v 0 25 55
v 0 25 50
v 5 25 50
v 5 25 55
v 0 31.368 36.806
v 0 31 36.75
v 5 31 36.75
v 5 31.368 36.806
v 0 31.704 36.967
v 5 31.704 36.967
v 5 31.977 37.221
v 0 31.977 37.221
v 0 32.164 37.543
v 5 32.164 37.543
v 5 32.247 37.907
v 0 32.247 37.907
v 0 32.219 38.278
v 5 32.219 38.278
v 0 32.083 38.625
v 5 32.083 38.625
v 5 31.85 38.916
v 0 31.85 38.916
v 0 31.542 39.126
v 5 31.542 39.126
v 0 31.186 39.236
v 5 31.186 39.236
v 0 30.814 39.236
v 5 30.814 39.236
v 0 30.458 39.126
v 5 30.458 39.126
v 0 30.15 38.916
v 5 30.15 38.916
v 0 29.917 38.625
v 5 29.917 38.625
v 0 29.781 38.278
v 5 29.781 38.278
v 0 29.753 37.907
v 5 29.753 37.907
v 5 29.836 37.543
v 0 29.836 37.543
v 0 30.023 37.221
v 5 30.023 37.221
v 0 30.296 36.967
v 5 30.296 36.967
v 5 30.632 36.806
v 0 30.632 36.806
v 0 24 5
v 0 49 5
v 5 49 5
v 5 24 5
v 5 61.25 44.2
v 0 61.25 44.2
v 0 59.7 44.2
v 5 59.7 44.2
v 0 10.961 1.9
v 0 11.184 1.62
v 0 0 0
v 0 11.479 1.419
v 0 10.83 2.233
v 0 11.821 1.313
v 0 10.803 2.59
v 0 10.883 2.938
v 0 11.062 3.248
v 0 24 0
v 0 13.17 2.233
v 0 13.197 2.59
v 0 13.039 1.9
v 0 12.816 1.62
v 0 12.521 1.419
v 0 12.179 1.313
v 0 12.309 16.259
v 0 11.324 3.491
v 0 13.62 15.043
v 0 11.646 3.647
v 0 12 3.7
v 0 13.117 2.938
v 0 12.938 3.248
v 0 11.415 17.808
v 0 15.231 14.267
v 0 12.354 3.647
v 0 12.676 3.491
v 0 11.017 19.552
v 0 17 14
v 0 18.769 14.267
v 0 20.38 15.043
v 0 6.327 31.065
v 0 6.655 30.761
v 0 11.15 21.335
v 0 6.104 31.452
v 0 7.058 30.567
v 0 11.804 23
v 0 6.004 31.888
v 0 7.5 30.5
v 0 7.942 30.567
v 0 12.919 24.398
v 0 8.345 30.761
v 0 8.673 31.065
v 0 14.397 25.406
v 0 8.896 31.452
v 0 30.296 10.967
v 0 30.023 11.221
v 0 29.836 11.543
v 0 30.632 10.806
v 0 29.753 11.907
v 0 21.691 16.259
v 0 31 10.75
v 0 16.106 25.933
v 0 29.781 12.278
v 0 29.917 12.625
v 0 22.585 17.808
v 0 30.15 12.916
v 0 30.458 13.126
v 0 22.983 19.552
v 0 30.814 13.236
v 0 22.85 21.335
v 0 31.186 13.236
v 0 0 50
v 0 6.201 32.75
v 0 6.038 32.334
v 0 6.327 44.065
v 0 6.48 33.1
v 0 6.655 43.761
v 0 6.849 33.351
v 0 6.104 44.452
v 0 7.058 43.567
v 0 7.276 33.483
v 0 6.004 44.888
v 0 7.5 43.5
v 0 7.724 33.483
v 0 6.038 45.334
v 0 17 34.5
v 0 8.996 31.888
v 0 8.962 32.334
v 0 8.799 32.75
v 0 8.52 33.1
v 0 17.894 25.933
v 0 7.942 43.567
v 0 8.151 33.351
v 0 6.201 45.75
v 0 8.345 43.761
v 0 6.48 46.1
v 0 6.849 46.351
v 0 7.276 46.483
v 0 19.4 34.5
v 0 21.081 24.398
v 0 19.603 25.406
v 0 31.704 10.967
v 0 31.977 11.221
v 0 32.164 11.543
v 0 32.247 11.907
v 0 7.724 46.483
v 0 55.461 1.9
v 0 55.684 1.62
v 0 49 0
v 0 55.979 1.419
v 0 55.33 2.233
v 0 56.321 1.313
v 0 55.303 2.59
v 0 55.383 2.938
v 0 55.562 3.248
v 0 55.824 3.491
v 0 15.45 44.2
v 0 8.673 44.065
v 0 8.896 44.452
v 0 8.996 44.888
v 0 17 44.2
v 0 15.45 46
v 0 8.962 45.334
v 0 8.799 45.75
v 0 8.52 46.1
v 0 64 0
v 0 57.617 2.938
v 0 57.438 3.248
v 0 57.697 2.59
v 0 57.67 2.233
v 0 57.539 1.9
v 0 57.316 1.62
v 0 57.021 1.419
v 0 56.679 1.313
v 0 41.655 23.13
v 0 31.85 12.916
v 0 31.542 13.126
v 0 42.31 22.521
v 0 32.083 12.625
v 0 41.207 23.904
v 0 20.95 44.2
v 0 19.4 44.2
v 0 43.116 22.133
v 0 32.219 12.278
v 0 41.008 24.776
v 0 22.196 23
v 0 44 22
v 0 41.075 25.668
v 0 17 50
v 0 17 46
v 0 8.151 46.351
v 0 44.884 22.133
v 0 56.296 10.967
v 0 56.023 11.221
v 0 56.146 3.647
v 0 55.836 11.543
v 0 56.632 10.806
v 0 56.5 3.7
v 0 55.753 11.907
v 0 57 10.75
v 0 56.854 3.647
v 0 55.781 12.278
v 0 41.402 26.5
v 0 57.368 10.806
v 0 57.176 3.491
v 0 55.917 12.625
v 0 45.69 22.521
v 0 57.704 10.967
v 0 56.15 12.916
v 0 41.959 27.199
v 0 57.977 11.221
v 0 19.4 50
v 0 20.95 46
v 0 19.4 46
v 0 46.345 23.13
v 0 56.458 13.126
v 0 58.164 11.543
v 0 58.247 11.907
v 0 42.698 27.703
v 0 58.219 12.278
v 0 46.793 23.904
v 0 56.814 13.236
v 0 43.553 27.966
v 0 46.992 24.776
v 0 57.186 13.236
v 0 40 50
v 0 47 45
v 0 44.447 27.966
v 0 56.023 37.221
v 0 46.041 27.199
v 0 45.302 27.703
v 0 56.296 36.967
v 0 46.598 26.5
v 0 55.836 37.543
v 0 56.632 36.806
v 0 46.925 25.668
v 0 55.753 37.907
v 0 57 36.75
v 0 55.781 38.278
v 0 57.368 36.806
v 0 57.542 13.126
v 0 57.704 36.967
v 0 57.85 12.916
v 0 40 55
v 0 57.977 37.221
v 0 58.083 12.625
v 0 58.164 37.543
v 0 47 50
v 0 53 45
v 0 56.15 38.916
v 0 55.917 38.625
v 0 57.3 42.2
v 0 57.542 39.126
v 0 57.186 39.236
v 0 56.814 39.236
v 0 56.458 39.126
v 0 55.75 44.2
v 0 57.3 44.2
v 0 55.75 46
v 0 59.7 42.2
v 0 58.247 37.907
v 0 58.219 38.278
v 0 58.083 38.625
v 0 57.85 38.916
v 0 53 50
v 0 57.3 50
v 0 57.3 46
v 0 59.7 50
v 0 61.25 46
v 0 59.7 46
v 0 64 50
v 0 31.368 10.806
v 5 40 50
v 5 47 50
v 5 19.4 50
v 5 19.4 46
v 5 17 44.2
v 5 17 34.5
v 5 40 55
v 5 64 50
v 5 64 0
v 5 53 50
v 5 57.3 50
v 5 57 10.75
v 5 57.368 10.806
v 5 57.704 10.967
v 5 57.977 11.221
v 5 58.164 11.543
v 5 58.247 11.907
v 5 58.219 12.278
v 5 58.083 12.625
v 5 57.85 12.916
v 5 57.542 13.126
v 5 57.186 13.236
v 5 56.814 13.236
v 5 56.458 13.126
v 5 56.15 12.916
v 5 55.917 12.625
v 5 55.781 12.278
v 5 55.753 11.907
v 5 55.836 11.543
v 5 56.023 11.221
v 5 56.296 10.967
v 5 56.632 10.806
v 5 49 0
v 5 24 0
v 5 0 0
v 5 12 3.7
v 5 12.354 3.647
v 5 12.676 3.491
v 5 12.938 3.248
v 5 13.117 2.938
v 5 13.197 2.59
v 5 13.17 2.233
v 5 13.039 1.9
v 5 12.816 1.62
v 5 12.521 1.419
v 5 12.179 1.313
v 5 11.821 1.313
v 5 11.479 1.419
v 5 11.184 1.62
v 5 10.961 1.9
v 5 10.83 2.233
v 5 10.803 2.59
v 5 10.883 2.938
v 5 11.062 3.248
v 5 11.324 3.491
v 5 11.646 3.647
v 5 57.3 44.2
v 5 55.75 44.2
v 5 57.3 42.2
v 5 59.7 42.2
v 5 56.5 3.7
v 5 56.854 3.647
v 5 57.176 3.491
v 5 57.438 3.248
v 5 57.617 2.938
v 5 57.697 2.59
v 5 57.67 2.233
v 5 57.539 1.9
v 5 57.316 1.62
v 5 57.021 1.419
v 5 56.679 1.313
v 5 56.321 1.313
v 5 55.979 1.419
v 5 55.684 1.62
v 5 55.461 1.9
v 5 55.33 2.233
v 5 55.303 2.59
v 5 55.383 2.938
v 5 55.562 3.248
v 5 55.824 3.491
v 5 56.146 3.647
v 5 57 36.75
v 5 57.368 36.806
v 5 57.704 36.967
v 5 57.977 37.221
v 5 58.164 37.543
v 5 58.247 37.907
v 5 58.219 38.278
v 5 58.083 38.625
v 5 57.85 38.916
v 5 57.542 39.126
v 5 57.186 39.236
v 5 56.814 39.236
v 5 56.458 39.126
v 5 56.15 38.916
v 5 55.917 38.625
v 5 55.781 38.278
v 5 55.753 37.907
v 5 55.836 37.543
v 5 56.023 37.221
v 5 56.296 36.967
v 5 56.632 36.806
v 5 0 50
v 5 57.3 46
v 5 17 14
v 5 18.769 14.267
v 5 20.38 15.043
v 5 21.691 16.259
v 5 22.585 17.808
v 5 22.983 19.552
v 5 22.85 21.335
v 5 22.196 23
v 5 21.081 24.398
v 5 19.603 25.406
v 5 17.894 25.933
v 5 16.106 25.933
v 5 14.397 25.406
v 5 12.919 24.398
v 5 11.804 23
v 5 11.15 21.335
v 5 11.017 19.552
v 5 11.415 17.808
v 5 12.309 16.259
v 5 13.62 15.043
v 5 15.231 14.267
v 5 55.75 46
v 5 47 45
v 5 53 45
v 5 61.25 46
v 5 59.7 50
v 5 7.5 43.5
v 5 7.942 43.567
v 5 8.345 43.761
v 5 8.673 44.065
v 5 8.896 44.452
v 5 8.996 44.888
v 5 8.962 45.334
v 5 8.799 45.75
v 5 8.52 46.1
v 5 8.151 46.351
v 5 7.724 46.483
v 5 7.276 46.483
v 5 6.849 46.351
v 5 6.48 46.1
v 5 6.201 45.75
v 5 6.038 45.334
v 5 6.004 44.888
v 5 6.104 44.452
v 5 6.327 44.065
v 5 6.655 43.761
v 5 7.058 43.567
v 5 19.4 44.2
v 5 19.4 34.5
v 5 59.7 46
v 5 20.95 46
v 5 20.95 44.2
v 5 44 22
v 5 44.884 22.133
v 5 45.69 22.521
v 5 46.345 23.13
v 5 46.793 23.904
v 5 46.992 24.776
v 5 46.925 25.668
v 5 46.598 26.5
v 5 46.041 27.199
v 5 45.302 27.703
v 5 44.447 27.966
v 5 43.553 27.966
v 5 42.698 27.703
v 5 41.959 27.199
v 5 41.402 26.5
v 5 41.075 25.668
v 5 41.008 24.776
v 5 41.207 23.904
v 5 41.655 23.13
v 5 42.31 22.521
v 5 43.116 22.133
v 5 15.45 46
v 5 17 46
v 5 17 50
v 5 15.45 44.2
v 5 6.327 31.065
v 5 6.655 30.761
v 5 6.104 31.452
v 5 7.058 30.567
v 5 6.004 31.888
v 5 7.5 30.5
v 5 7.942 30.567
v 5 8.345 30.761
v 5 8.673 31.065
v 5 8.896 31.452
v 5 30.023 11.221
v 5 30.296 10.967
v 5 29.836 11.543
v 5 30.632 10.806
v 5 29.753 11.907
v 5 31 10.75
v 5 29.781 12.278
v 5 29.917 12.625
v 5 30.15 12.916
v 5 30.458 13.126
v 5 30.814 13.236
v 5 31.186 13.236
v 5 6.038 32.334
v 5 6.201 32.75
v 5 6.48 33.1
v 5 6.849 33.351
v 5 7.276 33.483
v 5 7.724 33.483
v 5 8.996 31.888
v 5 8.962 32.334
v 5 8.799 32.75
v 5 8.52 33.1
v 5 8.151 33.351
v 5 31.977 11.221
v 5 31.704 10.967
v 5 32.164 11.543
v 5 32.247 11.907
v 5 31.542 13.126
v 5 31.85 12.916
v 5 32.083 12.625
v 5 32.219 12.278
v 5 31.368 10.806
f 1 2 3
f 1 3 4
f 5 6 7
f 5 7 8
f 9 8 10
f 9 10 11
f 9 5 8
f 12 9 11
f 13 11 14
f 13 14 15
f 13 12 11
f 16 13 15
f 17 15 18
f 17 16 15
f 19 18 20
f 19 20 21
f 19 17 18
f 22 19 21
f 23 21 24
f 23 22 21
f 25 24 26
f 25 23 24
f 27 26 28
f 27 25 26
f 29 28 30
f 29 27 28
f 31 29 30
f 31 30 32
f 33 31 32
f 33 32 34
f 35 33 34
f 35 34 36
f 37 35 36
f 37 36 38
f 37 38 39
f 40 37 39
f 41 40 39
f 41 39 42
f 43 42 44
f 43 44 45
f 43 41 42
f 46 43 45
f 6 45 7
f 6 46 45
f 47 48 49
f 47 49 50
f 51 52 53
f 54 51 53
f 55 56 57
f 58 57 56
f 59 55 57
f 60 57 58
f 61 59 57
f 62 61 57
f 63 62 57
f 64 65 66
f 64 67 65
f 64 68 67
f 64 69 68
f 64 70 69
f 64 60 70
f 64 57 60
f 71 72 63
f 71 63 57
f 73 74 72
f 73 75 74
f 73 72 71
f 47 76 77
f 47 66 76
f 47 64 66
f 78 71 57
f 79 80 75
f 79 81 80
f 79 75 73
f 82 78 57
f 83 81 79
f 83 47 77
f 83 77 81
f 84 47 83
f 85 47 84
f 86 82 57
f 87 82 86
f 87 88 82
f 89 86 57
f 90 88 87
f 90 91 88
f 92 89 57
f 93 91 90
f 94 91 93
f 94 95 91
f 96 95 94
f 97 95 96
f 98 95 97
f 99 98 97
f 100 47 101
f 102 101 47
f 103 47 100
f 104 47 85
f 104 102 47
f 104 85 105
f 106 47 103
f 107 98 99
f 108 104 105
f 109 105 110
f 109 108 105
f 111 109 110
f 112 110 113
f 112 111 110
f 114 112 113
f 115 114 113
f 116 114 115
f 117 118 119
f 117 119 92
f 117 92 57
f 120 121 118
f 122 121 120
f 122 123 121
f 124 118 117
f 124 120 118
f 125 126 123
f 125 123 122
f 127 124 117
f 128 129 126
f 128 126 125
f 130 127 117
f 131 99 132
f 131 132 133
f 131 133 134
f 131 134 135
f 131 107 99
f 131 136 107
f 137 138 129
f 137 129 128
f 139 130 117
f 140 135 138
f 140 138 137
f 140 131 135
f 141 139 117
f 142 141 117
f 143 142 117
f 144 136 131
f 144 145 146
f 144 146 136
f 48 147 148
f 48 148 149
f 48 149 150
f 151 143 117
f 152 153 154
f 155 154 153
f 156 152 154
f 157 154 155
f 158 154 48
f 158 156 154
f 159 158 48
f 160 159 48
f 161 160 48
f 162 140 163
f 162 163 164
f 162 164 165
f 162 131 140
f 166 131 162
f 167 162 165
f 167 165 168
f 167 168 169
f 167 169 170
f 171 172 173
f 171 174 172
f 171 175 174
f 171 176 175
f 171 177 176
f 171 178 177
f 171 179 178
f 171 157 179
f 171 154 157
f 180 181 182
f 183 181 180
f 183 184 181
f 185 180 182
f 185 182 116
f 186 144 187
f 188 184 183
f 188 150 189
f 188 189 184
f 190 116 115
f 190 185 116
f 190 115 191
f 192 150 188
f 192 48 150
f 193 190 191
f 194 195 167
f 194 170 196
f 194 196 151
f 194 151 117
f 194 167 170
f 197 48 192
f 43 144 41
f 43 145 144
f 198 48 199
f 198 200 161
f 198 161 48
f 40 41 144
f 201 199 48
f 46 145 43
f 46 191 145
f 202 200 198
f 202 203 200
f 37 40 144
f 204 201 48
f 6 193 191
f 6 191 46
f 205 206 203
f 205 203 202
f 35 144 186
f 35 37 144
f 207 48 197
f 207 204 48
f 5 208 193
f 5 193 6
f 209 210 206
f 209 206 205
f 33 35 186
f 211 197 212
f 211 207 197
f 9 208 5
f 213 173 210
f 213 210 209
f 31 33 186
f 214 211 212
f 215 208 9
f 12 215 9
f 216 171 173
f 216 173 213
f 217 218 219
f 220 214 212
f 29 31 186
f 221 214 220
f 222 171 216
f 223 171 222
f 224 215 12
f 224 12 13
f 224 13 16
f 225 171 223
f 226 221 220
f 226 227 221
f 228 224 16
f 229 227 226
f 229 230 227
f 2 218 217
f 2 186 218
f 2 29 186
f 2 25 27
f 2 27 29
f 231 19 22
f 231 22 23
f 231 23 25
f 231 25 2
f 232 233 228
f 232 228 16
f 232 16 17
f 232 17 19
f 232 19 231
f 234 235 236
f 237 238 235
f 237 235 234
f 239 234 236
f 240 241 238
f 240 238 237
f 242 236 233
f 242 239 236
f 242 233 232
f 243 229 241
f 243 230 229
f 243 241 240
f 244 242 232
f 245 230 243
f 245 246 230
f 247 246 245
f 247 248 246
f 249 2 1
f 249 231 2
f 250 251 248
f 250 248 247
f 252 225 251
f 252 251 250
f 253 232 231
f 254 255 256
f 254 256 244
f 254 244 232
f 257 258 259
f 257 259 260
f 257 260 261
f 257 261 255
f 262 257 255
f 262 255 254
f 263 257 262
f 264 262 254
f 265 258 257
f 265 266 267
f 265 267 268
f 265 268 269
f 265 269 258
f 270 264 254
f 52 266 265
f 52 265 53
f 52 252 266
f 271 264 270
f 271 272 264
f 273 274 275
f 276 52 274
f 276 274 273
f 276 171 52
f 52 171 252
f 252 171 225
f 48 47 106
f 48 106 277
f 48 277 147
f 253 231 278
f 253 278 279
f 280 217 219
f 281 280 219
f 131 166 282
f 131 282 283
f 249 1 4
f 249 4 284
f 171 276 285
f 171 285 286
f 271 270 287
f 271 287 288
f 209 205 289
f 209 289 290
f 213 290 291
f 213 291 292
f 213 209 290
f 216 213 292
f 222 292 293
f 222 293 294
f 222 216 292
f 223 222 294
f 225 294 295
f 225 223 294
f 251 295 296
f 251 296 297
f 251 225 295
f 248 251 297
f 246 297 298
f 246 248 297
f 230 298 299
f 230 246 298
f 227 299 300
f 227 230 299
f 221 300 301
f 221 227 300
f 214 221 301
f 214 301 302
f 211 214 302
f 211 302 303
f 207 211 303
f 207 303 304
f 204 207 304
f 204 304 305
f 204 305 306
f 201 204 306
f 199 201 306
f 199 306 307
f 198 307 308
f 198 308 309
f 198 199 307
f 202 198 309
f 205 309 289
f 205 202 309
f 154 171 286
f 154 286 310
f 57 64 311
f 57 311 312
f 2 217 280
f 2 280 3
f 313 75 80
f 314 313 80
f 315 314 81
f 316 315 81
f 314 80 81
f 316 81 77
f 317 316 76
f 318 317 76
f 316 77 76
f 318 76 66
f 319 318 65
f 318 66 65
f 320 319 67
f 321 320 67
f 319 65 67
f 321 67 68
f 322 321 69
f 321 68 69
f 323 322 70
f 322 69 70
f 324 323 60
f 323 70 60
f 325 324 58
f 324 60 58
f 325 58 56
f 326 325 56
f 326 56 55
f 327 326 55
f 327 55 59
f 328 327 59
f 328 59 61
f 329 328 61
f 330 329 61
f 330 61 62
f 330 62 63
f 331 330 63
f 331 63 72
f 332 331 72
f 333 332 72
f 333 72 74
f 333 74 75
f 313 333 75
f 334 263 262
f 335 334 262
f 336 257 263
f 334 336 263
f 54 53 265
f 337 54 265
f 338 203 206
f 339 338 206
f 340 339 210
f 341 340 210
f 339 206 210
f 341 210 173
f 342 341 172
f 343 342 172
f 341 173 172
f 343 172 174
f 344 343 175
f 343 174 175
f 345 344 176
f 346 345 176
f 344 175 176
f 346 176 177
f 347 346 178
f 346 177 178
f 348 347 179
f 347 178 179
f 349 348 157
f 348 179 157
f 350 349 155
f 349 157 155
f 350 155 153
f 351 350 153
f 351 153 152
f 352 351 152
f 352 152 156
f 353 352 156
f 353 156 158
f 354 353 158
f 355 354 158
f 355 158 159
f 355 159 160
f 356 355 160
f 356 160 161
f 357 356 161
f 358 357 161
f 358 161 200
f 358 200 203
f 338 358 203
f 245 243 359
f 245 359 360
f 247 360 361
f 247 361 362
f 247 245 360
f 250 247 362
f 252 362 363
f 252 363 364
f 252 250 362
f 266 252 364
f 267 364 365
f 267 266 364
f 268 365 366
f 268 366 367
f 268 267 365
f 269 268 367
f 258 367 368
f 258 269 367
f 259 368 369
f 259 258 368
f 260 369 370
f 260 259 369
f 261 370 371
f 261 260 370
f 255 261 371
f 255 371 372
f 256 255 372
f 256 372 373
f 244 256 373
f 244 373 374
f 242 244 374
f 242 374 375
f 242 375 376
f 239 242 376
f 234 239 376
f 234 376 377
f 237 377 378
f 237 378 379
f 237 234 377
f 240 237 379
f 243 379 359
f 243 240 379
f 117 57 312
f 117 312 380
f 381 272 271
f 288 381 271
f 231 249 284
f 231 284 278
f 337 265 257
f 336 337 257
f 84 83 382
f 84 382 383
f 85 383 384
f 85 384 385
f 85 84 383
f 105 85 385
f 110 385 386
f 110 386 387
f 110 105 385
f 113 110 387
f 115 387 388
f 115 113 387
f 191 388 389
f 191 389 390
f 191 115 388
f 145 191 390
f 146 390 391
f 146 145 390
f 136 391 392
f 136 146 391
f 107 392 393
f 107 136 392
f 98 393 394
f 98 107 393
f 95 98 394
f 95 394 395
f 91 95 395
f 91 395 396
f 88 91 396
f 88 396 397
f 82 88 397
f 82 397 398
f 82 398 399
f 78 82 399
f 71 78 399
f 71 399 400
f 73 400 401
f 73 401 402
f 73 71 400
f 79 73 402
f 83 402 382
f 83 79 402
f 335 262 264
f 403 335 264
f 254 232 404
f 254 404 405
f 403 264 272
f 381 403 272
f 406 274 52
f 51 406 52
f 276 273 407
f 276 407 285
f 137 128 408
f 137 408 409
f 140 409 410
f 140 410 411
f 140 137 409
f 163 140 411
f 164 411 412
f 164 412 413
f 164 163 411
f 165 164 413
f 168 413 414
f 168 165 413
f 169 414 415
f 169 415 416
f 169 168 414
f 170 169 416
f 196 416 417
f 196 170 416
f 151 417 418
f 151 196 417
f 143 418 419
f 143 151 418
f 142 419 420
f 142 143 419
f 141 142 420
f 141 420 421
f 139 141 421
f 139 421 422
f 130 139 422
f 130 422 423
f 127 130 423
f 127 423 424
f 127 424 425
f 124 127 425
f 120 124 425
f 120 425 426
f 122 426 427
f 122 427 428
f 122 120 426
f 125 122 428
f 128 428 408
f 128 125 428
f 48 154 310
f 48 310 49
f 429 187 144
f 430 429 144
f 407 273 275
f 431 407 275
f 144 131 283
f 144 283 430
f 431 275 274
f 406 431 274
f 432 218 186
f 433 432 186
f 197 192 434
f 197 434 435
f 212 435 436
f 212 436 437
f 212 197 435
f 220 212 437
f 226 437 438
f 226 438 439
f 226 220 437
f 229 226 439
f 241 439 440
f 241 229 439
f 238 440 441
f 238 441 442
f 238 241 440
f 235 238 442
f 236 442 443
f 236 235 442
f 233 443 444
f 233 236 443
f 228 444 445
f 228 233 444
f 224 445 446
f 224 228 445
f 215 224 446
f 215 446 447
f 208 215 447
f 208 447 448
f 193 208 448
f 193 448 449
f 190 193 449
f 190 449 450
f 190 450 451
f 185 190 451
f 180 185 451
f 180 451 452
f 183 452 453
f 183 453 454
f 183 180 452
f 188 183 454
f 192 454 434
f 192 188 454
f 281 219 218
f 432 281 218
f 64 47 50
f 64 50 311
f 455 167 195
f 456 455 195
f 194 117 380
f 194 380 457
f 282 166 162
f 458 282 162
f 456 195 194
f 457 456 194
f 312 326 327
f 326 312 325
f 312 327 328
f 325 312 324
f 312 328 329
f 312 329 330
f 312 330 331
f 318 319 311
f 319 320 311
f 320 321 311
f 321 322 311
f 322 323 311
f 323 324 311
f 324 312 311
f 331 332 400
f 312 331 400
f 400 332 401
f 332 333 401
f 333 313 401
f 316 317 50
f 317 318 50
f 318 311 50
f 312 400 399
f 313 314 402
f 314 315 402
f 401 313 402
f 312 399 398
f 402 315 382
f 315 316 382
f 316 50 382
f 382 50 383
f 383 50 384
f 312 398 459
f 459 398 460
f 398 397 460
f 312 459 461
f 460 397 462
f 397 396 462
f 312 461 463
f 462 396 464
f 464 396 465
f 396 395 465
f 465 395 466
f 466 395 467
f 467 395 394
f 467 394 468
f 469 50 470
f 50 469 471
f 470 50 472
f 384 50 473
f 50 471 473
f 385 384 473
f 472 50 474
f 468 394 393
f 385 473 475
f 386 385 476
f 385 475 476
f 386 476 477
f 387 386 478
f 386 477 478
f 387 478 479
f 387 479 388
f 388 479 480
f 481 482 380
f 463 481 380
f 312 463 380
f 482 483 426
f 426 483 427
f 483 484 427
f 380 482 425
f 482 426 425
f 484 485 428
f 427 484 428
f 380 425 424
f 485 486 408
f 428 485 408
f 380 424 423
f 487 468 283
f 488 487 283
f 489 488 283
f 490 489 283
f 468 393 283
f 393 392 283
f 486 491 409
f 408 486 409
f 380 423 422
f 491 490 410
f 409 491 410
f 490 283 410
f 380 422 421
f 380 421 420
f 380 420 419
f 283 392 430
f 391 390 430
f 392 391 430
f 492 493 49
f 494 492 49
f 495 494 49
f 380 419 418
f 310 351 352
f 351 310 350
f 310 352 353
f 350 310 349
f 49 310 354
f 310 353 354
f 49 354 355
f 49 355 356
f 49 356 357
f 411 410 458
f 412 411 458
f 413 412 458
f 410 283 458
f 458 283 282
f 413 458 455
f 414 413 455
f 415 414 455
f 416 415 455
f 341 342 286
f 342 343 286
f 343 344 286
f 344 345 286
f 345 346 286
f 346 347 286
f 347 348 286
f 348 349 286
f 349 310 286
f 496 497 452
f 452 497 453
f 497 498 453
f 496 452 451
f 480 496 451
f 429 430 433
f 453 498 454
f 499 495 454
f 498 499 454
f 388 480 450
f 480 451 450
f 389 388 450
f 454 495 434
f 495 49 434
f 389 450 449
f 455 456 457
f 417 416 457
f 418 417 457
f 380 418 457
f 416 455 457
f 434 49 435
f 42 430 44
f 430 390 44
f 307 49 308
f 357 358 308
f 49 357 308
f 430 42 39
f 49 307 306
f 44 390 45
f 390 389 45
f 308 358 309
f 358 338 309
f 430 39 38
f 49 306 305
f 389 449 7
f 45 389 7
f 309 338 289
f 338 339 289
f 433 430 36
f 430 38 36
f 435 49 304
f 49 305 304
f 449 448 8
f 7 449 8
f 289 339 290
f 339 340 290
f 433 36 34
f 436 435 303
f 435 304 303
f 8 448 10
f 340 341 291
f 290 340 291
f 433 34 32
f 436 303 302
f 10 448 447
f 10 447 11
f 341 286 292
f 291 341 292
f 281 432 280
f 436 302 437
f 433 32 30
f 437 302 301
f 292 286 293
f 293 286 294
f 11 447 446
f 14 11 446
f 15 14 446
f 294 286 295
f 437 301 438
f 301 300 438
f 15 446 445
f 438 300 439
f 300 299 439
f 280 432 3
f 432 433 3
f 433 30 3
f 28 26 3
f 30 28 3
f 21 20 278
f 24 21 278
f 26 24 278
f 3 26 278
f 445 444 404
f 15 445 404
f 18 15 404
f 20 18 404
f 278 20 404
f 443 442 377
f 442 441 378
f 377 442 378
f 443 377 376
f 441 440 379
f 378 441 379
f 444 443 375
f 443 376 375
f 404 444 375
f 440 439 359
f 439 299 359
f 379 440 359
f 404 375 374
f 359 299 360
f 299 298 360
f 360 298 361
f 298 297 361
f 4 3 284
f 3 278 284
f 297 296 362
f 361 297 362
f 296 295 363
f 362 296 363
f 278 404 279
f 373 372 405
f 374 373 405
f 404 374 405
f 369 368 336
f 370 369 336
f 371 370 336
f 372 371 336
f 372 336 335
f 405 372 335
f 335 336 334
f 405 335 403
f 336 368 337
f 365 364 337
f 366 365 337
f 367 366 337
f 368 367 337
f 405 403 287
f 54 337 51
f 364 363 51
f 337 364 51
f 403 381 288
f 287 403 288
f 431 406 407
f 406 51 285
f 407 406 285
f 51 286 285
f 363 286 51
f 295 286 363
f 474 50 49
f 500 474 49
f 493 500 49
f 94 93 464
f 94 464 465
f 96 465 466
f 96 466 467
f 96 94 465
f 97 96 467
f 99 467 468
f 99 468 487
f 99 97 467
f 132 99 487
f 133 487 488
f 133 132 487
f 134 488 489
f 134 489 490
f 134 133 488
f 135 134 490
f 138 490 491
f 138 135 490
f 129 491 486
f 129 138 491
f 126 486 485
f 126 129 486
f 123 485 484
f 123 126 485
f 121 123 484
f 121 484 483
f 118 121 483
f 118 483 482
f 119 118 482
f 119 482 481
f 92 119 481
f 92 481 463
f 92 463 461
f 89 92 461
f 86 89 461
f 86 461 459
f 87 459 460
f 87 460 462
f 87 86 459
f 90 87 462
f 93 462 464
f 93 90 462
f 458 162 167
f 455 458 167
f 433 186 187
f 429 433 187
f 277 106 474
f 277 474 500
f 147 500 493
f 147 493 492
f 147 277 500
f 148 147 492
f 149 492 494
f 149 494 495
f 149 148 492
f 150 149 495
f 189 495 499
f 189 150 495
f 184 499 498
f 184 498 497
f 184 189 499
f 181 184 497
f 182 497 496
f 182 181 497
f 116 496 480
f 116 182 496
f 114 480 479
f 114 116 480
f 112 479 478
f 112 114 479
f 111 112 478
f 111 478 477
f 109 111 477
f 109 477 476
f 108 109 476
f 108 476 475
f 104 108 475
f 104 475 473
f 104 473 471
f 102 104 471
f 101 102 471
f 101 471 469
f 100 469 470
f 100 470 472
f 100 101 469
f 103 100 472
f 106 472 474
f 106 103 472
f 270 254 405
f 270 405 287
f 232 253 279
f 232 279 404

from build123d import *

# Parameters (mm, degrees)
SKETCH1_R           = 6
SKETCH1_R_2         = 3
SKETCH1_R_3         = 1.5
SKETCH1_R_4         = 1.25
SKETCH1_W           = 8
SKETCH1_H           = 2.4
BOSS_EXTRUDE1_DEPTH = 5
SKETCH2_R           = 1.2
CUT_EXTRUDE1_DEPTH  = 6


with BuildPart() as part:
    # Sketch1 → Boss-Extrude1 (new body)
    with BuildSketch(Plane(origin=(0, 0, 0), x_dir=(0, 0, -1), z_dir=(1, 0, 0))):
        Polygon((0, 0), (-50, 0), (-50, 25), (-55, 25), (-55, 40), (-50, 40), (-50, 47), (-45, 47), (-45, 53), (-50, 53), (-50, 64), (0, 64), (0, 49), (-5, 49), (-5, 24), (0, 24), align=None)
        with Locations((-20, 17)):
            Circle(SKETCH1_R, mode=Mode.SUBTRACT)
        with Locations((-25, 44)):
            Circle(SKETCH1_R_2, mode=Mode.SUBTRACT)
        with Locations((-45, 7.5)):
            Circle(SKETCH1_R_3, mode=Mode.SUBTRACT)
        with Locations((-38, 57)):
            Circle(SKETCH1_R_4, mode=Mode.SUBTRACT)
        with Locations((-12, 57)):
            Circle(SKETCH1_R_4, mode=Mode.SUBTRACT)
        with Locations((-38, 31)):
            Circle(SKETCH1_R_4, mode=Mode.SUBTRACT)
        with Locations((-12, 31)):
            Circle(SKETCH1_R_4, mode=Mode.SUBTRACT)
        with Locations((-32, 7.5)):
            Circle(SKETCH1_R_3, mode=Mode.SUBTRACT)
        with Locations((-38.5, 18.2)):
            Rectangle(SKETCH1_W, SKETCH1_H, mode=Mode.SUBTRACT)
    extrude(amount=BOSS_EXTRUDE1_DEPTH)

    # Sketch2 → Cut-Extrude1 (cut, through all)
    with BuildSketch(Plane.ZY):
        with Locations((2.5, 56.5)):
            Circle(SKETCH2_R)
        with Locations((2.5, 12)):
            Circle(SKETCH2_R)
        Polygon((50, 59.7), (46, 59.7), (46, 61.25), (44.2, 61.25), (44.2, 59.7), (42.2, 59.7), (42.2, 57.3), (44.2, 57.3), (44.2, 55.75), (46, 55.75), (46, 57.3), (50, 57.3), align=None)
        Polygon((50, 19.4), (46, 19.4), (46, 20.95), (44.2, 20.95), (44.2, 19.4), (42.2, 19.4), (42.2, 17), (44.2, 17), (44.2, 15.45), (46, 15.45), (46, 17), (50, 17), align=None)
    extrude(amount=-CUT_EXTRUDE1_DEPTH, mode=Mode.SUBTRACT)


solid = part.part
